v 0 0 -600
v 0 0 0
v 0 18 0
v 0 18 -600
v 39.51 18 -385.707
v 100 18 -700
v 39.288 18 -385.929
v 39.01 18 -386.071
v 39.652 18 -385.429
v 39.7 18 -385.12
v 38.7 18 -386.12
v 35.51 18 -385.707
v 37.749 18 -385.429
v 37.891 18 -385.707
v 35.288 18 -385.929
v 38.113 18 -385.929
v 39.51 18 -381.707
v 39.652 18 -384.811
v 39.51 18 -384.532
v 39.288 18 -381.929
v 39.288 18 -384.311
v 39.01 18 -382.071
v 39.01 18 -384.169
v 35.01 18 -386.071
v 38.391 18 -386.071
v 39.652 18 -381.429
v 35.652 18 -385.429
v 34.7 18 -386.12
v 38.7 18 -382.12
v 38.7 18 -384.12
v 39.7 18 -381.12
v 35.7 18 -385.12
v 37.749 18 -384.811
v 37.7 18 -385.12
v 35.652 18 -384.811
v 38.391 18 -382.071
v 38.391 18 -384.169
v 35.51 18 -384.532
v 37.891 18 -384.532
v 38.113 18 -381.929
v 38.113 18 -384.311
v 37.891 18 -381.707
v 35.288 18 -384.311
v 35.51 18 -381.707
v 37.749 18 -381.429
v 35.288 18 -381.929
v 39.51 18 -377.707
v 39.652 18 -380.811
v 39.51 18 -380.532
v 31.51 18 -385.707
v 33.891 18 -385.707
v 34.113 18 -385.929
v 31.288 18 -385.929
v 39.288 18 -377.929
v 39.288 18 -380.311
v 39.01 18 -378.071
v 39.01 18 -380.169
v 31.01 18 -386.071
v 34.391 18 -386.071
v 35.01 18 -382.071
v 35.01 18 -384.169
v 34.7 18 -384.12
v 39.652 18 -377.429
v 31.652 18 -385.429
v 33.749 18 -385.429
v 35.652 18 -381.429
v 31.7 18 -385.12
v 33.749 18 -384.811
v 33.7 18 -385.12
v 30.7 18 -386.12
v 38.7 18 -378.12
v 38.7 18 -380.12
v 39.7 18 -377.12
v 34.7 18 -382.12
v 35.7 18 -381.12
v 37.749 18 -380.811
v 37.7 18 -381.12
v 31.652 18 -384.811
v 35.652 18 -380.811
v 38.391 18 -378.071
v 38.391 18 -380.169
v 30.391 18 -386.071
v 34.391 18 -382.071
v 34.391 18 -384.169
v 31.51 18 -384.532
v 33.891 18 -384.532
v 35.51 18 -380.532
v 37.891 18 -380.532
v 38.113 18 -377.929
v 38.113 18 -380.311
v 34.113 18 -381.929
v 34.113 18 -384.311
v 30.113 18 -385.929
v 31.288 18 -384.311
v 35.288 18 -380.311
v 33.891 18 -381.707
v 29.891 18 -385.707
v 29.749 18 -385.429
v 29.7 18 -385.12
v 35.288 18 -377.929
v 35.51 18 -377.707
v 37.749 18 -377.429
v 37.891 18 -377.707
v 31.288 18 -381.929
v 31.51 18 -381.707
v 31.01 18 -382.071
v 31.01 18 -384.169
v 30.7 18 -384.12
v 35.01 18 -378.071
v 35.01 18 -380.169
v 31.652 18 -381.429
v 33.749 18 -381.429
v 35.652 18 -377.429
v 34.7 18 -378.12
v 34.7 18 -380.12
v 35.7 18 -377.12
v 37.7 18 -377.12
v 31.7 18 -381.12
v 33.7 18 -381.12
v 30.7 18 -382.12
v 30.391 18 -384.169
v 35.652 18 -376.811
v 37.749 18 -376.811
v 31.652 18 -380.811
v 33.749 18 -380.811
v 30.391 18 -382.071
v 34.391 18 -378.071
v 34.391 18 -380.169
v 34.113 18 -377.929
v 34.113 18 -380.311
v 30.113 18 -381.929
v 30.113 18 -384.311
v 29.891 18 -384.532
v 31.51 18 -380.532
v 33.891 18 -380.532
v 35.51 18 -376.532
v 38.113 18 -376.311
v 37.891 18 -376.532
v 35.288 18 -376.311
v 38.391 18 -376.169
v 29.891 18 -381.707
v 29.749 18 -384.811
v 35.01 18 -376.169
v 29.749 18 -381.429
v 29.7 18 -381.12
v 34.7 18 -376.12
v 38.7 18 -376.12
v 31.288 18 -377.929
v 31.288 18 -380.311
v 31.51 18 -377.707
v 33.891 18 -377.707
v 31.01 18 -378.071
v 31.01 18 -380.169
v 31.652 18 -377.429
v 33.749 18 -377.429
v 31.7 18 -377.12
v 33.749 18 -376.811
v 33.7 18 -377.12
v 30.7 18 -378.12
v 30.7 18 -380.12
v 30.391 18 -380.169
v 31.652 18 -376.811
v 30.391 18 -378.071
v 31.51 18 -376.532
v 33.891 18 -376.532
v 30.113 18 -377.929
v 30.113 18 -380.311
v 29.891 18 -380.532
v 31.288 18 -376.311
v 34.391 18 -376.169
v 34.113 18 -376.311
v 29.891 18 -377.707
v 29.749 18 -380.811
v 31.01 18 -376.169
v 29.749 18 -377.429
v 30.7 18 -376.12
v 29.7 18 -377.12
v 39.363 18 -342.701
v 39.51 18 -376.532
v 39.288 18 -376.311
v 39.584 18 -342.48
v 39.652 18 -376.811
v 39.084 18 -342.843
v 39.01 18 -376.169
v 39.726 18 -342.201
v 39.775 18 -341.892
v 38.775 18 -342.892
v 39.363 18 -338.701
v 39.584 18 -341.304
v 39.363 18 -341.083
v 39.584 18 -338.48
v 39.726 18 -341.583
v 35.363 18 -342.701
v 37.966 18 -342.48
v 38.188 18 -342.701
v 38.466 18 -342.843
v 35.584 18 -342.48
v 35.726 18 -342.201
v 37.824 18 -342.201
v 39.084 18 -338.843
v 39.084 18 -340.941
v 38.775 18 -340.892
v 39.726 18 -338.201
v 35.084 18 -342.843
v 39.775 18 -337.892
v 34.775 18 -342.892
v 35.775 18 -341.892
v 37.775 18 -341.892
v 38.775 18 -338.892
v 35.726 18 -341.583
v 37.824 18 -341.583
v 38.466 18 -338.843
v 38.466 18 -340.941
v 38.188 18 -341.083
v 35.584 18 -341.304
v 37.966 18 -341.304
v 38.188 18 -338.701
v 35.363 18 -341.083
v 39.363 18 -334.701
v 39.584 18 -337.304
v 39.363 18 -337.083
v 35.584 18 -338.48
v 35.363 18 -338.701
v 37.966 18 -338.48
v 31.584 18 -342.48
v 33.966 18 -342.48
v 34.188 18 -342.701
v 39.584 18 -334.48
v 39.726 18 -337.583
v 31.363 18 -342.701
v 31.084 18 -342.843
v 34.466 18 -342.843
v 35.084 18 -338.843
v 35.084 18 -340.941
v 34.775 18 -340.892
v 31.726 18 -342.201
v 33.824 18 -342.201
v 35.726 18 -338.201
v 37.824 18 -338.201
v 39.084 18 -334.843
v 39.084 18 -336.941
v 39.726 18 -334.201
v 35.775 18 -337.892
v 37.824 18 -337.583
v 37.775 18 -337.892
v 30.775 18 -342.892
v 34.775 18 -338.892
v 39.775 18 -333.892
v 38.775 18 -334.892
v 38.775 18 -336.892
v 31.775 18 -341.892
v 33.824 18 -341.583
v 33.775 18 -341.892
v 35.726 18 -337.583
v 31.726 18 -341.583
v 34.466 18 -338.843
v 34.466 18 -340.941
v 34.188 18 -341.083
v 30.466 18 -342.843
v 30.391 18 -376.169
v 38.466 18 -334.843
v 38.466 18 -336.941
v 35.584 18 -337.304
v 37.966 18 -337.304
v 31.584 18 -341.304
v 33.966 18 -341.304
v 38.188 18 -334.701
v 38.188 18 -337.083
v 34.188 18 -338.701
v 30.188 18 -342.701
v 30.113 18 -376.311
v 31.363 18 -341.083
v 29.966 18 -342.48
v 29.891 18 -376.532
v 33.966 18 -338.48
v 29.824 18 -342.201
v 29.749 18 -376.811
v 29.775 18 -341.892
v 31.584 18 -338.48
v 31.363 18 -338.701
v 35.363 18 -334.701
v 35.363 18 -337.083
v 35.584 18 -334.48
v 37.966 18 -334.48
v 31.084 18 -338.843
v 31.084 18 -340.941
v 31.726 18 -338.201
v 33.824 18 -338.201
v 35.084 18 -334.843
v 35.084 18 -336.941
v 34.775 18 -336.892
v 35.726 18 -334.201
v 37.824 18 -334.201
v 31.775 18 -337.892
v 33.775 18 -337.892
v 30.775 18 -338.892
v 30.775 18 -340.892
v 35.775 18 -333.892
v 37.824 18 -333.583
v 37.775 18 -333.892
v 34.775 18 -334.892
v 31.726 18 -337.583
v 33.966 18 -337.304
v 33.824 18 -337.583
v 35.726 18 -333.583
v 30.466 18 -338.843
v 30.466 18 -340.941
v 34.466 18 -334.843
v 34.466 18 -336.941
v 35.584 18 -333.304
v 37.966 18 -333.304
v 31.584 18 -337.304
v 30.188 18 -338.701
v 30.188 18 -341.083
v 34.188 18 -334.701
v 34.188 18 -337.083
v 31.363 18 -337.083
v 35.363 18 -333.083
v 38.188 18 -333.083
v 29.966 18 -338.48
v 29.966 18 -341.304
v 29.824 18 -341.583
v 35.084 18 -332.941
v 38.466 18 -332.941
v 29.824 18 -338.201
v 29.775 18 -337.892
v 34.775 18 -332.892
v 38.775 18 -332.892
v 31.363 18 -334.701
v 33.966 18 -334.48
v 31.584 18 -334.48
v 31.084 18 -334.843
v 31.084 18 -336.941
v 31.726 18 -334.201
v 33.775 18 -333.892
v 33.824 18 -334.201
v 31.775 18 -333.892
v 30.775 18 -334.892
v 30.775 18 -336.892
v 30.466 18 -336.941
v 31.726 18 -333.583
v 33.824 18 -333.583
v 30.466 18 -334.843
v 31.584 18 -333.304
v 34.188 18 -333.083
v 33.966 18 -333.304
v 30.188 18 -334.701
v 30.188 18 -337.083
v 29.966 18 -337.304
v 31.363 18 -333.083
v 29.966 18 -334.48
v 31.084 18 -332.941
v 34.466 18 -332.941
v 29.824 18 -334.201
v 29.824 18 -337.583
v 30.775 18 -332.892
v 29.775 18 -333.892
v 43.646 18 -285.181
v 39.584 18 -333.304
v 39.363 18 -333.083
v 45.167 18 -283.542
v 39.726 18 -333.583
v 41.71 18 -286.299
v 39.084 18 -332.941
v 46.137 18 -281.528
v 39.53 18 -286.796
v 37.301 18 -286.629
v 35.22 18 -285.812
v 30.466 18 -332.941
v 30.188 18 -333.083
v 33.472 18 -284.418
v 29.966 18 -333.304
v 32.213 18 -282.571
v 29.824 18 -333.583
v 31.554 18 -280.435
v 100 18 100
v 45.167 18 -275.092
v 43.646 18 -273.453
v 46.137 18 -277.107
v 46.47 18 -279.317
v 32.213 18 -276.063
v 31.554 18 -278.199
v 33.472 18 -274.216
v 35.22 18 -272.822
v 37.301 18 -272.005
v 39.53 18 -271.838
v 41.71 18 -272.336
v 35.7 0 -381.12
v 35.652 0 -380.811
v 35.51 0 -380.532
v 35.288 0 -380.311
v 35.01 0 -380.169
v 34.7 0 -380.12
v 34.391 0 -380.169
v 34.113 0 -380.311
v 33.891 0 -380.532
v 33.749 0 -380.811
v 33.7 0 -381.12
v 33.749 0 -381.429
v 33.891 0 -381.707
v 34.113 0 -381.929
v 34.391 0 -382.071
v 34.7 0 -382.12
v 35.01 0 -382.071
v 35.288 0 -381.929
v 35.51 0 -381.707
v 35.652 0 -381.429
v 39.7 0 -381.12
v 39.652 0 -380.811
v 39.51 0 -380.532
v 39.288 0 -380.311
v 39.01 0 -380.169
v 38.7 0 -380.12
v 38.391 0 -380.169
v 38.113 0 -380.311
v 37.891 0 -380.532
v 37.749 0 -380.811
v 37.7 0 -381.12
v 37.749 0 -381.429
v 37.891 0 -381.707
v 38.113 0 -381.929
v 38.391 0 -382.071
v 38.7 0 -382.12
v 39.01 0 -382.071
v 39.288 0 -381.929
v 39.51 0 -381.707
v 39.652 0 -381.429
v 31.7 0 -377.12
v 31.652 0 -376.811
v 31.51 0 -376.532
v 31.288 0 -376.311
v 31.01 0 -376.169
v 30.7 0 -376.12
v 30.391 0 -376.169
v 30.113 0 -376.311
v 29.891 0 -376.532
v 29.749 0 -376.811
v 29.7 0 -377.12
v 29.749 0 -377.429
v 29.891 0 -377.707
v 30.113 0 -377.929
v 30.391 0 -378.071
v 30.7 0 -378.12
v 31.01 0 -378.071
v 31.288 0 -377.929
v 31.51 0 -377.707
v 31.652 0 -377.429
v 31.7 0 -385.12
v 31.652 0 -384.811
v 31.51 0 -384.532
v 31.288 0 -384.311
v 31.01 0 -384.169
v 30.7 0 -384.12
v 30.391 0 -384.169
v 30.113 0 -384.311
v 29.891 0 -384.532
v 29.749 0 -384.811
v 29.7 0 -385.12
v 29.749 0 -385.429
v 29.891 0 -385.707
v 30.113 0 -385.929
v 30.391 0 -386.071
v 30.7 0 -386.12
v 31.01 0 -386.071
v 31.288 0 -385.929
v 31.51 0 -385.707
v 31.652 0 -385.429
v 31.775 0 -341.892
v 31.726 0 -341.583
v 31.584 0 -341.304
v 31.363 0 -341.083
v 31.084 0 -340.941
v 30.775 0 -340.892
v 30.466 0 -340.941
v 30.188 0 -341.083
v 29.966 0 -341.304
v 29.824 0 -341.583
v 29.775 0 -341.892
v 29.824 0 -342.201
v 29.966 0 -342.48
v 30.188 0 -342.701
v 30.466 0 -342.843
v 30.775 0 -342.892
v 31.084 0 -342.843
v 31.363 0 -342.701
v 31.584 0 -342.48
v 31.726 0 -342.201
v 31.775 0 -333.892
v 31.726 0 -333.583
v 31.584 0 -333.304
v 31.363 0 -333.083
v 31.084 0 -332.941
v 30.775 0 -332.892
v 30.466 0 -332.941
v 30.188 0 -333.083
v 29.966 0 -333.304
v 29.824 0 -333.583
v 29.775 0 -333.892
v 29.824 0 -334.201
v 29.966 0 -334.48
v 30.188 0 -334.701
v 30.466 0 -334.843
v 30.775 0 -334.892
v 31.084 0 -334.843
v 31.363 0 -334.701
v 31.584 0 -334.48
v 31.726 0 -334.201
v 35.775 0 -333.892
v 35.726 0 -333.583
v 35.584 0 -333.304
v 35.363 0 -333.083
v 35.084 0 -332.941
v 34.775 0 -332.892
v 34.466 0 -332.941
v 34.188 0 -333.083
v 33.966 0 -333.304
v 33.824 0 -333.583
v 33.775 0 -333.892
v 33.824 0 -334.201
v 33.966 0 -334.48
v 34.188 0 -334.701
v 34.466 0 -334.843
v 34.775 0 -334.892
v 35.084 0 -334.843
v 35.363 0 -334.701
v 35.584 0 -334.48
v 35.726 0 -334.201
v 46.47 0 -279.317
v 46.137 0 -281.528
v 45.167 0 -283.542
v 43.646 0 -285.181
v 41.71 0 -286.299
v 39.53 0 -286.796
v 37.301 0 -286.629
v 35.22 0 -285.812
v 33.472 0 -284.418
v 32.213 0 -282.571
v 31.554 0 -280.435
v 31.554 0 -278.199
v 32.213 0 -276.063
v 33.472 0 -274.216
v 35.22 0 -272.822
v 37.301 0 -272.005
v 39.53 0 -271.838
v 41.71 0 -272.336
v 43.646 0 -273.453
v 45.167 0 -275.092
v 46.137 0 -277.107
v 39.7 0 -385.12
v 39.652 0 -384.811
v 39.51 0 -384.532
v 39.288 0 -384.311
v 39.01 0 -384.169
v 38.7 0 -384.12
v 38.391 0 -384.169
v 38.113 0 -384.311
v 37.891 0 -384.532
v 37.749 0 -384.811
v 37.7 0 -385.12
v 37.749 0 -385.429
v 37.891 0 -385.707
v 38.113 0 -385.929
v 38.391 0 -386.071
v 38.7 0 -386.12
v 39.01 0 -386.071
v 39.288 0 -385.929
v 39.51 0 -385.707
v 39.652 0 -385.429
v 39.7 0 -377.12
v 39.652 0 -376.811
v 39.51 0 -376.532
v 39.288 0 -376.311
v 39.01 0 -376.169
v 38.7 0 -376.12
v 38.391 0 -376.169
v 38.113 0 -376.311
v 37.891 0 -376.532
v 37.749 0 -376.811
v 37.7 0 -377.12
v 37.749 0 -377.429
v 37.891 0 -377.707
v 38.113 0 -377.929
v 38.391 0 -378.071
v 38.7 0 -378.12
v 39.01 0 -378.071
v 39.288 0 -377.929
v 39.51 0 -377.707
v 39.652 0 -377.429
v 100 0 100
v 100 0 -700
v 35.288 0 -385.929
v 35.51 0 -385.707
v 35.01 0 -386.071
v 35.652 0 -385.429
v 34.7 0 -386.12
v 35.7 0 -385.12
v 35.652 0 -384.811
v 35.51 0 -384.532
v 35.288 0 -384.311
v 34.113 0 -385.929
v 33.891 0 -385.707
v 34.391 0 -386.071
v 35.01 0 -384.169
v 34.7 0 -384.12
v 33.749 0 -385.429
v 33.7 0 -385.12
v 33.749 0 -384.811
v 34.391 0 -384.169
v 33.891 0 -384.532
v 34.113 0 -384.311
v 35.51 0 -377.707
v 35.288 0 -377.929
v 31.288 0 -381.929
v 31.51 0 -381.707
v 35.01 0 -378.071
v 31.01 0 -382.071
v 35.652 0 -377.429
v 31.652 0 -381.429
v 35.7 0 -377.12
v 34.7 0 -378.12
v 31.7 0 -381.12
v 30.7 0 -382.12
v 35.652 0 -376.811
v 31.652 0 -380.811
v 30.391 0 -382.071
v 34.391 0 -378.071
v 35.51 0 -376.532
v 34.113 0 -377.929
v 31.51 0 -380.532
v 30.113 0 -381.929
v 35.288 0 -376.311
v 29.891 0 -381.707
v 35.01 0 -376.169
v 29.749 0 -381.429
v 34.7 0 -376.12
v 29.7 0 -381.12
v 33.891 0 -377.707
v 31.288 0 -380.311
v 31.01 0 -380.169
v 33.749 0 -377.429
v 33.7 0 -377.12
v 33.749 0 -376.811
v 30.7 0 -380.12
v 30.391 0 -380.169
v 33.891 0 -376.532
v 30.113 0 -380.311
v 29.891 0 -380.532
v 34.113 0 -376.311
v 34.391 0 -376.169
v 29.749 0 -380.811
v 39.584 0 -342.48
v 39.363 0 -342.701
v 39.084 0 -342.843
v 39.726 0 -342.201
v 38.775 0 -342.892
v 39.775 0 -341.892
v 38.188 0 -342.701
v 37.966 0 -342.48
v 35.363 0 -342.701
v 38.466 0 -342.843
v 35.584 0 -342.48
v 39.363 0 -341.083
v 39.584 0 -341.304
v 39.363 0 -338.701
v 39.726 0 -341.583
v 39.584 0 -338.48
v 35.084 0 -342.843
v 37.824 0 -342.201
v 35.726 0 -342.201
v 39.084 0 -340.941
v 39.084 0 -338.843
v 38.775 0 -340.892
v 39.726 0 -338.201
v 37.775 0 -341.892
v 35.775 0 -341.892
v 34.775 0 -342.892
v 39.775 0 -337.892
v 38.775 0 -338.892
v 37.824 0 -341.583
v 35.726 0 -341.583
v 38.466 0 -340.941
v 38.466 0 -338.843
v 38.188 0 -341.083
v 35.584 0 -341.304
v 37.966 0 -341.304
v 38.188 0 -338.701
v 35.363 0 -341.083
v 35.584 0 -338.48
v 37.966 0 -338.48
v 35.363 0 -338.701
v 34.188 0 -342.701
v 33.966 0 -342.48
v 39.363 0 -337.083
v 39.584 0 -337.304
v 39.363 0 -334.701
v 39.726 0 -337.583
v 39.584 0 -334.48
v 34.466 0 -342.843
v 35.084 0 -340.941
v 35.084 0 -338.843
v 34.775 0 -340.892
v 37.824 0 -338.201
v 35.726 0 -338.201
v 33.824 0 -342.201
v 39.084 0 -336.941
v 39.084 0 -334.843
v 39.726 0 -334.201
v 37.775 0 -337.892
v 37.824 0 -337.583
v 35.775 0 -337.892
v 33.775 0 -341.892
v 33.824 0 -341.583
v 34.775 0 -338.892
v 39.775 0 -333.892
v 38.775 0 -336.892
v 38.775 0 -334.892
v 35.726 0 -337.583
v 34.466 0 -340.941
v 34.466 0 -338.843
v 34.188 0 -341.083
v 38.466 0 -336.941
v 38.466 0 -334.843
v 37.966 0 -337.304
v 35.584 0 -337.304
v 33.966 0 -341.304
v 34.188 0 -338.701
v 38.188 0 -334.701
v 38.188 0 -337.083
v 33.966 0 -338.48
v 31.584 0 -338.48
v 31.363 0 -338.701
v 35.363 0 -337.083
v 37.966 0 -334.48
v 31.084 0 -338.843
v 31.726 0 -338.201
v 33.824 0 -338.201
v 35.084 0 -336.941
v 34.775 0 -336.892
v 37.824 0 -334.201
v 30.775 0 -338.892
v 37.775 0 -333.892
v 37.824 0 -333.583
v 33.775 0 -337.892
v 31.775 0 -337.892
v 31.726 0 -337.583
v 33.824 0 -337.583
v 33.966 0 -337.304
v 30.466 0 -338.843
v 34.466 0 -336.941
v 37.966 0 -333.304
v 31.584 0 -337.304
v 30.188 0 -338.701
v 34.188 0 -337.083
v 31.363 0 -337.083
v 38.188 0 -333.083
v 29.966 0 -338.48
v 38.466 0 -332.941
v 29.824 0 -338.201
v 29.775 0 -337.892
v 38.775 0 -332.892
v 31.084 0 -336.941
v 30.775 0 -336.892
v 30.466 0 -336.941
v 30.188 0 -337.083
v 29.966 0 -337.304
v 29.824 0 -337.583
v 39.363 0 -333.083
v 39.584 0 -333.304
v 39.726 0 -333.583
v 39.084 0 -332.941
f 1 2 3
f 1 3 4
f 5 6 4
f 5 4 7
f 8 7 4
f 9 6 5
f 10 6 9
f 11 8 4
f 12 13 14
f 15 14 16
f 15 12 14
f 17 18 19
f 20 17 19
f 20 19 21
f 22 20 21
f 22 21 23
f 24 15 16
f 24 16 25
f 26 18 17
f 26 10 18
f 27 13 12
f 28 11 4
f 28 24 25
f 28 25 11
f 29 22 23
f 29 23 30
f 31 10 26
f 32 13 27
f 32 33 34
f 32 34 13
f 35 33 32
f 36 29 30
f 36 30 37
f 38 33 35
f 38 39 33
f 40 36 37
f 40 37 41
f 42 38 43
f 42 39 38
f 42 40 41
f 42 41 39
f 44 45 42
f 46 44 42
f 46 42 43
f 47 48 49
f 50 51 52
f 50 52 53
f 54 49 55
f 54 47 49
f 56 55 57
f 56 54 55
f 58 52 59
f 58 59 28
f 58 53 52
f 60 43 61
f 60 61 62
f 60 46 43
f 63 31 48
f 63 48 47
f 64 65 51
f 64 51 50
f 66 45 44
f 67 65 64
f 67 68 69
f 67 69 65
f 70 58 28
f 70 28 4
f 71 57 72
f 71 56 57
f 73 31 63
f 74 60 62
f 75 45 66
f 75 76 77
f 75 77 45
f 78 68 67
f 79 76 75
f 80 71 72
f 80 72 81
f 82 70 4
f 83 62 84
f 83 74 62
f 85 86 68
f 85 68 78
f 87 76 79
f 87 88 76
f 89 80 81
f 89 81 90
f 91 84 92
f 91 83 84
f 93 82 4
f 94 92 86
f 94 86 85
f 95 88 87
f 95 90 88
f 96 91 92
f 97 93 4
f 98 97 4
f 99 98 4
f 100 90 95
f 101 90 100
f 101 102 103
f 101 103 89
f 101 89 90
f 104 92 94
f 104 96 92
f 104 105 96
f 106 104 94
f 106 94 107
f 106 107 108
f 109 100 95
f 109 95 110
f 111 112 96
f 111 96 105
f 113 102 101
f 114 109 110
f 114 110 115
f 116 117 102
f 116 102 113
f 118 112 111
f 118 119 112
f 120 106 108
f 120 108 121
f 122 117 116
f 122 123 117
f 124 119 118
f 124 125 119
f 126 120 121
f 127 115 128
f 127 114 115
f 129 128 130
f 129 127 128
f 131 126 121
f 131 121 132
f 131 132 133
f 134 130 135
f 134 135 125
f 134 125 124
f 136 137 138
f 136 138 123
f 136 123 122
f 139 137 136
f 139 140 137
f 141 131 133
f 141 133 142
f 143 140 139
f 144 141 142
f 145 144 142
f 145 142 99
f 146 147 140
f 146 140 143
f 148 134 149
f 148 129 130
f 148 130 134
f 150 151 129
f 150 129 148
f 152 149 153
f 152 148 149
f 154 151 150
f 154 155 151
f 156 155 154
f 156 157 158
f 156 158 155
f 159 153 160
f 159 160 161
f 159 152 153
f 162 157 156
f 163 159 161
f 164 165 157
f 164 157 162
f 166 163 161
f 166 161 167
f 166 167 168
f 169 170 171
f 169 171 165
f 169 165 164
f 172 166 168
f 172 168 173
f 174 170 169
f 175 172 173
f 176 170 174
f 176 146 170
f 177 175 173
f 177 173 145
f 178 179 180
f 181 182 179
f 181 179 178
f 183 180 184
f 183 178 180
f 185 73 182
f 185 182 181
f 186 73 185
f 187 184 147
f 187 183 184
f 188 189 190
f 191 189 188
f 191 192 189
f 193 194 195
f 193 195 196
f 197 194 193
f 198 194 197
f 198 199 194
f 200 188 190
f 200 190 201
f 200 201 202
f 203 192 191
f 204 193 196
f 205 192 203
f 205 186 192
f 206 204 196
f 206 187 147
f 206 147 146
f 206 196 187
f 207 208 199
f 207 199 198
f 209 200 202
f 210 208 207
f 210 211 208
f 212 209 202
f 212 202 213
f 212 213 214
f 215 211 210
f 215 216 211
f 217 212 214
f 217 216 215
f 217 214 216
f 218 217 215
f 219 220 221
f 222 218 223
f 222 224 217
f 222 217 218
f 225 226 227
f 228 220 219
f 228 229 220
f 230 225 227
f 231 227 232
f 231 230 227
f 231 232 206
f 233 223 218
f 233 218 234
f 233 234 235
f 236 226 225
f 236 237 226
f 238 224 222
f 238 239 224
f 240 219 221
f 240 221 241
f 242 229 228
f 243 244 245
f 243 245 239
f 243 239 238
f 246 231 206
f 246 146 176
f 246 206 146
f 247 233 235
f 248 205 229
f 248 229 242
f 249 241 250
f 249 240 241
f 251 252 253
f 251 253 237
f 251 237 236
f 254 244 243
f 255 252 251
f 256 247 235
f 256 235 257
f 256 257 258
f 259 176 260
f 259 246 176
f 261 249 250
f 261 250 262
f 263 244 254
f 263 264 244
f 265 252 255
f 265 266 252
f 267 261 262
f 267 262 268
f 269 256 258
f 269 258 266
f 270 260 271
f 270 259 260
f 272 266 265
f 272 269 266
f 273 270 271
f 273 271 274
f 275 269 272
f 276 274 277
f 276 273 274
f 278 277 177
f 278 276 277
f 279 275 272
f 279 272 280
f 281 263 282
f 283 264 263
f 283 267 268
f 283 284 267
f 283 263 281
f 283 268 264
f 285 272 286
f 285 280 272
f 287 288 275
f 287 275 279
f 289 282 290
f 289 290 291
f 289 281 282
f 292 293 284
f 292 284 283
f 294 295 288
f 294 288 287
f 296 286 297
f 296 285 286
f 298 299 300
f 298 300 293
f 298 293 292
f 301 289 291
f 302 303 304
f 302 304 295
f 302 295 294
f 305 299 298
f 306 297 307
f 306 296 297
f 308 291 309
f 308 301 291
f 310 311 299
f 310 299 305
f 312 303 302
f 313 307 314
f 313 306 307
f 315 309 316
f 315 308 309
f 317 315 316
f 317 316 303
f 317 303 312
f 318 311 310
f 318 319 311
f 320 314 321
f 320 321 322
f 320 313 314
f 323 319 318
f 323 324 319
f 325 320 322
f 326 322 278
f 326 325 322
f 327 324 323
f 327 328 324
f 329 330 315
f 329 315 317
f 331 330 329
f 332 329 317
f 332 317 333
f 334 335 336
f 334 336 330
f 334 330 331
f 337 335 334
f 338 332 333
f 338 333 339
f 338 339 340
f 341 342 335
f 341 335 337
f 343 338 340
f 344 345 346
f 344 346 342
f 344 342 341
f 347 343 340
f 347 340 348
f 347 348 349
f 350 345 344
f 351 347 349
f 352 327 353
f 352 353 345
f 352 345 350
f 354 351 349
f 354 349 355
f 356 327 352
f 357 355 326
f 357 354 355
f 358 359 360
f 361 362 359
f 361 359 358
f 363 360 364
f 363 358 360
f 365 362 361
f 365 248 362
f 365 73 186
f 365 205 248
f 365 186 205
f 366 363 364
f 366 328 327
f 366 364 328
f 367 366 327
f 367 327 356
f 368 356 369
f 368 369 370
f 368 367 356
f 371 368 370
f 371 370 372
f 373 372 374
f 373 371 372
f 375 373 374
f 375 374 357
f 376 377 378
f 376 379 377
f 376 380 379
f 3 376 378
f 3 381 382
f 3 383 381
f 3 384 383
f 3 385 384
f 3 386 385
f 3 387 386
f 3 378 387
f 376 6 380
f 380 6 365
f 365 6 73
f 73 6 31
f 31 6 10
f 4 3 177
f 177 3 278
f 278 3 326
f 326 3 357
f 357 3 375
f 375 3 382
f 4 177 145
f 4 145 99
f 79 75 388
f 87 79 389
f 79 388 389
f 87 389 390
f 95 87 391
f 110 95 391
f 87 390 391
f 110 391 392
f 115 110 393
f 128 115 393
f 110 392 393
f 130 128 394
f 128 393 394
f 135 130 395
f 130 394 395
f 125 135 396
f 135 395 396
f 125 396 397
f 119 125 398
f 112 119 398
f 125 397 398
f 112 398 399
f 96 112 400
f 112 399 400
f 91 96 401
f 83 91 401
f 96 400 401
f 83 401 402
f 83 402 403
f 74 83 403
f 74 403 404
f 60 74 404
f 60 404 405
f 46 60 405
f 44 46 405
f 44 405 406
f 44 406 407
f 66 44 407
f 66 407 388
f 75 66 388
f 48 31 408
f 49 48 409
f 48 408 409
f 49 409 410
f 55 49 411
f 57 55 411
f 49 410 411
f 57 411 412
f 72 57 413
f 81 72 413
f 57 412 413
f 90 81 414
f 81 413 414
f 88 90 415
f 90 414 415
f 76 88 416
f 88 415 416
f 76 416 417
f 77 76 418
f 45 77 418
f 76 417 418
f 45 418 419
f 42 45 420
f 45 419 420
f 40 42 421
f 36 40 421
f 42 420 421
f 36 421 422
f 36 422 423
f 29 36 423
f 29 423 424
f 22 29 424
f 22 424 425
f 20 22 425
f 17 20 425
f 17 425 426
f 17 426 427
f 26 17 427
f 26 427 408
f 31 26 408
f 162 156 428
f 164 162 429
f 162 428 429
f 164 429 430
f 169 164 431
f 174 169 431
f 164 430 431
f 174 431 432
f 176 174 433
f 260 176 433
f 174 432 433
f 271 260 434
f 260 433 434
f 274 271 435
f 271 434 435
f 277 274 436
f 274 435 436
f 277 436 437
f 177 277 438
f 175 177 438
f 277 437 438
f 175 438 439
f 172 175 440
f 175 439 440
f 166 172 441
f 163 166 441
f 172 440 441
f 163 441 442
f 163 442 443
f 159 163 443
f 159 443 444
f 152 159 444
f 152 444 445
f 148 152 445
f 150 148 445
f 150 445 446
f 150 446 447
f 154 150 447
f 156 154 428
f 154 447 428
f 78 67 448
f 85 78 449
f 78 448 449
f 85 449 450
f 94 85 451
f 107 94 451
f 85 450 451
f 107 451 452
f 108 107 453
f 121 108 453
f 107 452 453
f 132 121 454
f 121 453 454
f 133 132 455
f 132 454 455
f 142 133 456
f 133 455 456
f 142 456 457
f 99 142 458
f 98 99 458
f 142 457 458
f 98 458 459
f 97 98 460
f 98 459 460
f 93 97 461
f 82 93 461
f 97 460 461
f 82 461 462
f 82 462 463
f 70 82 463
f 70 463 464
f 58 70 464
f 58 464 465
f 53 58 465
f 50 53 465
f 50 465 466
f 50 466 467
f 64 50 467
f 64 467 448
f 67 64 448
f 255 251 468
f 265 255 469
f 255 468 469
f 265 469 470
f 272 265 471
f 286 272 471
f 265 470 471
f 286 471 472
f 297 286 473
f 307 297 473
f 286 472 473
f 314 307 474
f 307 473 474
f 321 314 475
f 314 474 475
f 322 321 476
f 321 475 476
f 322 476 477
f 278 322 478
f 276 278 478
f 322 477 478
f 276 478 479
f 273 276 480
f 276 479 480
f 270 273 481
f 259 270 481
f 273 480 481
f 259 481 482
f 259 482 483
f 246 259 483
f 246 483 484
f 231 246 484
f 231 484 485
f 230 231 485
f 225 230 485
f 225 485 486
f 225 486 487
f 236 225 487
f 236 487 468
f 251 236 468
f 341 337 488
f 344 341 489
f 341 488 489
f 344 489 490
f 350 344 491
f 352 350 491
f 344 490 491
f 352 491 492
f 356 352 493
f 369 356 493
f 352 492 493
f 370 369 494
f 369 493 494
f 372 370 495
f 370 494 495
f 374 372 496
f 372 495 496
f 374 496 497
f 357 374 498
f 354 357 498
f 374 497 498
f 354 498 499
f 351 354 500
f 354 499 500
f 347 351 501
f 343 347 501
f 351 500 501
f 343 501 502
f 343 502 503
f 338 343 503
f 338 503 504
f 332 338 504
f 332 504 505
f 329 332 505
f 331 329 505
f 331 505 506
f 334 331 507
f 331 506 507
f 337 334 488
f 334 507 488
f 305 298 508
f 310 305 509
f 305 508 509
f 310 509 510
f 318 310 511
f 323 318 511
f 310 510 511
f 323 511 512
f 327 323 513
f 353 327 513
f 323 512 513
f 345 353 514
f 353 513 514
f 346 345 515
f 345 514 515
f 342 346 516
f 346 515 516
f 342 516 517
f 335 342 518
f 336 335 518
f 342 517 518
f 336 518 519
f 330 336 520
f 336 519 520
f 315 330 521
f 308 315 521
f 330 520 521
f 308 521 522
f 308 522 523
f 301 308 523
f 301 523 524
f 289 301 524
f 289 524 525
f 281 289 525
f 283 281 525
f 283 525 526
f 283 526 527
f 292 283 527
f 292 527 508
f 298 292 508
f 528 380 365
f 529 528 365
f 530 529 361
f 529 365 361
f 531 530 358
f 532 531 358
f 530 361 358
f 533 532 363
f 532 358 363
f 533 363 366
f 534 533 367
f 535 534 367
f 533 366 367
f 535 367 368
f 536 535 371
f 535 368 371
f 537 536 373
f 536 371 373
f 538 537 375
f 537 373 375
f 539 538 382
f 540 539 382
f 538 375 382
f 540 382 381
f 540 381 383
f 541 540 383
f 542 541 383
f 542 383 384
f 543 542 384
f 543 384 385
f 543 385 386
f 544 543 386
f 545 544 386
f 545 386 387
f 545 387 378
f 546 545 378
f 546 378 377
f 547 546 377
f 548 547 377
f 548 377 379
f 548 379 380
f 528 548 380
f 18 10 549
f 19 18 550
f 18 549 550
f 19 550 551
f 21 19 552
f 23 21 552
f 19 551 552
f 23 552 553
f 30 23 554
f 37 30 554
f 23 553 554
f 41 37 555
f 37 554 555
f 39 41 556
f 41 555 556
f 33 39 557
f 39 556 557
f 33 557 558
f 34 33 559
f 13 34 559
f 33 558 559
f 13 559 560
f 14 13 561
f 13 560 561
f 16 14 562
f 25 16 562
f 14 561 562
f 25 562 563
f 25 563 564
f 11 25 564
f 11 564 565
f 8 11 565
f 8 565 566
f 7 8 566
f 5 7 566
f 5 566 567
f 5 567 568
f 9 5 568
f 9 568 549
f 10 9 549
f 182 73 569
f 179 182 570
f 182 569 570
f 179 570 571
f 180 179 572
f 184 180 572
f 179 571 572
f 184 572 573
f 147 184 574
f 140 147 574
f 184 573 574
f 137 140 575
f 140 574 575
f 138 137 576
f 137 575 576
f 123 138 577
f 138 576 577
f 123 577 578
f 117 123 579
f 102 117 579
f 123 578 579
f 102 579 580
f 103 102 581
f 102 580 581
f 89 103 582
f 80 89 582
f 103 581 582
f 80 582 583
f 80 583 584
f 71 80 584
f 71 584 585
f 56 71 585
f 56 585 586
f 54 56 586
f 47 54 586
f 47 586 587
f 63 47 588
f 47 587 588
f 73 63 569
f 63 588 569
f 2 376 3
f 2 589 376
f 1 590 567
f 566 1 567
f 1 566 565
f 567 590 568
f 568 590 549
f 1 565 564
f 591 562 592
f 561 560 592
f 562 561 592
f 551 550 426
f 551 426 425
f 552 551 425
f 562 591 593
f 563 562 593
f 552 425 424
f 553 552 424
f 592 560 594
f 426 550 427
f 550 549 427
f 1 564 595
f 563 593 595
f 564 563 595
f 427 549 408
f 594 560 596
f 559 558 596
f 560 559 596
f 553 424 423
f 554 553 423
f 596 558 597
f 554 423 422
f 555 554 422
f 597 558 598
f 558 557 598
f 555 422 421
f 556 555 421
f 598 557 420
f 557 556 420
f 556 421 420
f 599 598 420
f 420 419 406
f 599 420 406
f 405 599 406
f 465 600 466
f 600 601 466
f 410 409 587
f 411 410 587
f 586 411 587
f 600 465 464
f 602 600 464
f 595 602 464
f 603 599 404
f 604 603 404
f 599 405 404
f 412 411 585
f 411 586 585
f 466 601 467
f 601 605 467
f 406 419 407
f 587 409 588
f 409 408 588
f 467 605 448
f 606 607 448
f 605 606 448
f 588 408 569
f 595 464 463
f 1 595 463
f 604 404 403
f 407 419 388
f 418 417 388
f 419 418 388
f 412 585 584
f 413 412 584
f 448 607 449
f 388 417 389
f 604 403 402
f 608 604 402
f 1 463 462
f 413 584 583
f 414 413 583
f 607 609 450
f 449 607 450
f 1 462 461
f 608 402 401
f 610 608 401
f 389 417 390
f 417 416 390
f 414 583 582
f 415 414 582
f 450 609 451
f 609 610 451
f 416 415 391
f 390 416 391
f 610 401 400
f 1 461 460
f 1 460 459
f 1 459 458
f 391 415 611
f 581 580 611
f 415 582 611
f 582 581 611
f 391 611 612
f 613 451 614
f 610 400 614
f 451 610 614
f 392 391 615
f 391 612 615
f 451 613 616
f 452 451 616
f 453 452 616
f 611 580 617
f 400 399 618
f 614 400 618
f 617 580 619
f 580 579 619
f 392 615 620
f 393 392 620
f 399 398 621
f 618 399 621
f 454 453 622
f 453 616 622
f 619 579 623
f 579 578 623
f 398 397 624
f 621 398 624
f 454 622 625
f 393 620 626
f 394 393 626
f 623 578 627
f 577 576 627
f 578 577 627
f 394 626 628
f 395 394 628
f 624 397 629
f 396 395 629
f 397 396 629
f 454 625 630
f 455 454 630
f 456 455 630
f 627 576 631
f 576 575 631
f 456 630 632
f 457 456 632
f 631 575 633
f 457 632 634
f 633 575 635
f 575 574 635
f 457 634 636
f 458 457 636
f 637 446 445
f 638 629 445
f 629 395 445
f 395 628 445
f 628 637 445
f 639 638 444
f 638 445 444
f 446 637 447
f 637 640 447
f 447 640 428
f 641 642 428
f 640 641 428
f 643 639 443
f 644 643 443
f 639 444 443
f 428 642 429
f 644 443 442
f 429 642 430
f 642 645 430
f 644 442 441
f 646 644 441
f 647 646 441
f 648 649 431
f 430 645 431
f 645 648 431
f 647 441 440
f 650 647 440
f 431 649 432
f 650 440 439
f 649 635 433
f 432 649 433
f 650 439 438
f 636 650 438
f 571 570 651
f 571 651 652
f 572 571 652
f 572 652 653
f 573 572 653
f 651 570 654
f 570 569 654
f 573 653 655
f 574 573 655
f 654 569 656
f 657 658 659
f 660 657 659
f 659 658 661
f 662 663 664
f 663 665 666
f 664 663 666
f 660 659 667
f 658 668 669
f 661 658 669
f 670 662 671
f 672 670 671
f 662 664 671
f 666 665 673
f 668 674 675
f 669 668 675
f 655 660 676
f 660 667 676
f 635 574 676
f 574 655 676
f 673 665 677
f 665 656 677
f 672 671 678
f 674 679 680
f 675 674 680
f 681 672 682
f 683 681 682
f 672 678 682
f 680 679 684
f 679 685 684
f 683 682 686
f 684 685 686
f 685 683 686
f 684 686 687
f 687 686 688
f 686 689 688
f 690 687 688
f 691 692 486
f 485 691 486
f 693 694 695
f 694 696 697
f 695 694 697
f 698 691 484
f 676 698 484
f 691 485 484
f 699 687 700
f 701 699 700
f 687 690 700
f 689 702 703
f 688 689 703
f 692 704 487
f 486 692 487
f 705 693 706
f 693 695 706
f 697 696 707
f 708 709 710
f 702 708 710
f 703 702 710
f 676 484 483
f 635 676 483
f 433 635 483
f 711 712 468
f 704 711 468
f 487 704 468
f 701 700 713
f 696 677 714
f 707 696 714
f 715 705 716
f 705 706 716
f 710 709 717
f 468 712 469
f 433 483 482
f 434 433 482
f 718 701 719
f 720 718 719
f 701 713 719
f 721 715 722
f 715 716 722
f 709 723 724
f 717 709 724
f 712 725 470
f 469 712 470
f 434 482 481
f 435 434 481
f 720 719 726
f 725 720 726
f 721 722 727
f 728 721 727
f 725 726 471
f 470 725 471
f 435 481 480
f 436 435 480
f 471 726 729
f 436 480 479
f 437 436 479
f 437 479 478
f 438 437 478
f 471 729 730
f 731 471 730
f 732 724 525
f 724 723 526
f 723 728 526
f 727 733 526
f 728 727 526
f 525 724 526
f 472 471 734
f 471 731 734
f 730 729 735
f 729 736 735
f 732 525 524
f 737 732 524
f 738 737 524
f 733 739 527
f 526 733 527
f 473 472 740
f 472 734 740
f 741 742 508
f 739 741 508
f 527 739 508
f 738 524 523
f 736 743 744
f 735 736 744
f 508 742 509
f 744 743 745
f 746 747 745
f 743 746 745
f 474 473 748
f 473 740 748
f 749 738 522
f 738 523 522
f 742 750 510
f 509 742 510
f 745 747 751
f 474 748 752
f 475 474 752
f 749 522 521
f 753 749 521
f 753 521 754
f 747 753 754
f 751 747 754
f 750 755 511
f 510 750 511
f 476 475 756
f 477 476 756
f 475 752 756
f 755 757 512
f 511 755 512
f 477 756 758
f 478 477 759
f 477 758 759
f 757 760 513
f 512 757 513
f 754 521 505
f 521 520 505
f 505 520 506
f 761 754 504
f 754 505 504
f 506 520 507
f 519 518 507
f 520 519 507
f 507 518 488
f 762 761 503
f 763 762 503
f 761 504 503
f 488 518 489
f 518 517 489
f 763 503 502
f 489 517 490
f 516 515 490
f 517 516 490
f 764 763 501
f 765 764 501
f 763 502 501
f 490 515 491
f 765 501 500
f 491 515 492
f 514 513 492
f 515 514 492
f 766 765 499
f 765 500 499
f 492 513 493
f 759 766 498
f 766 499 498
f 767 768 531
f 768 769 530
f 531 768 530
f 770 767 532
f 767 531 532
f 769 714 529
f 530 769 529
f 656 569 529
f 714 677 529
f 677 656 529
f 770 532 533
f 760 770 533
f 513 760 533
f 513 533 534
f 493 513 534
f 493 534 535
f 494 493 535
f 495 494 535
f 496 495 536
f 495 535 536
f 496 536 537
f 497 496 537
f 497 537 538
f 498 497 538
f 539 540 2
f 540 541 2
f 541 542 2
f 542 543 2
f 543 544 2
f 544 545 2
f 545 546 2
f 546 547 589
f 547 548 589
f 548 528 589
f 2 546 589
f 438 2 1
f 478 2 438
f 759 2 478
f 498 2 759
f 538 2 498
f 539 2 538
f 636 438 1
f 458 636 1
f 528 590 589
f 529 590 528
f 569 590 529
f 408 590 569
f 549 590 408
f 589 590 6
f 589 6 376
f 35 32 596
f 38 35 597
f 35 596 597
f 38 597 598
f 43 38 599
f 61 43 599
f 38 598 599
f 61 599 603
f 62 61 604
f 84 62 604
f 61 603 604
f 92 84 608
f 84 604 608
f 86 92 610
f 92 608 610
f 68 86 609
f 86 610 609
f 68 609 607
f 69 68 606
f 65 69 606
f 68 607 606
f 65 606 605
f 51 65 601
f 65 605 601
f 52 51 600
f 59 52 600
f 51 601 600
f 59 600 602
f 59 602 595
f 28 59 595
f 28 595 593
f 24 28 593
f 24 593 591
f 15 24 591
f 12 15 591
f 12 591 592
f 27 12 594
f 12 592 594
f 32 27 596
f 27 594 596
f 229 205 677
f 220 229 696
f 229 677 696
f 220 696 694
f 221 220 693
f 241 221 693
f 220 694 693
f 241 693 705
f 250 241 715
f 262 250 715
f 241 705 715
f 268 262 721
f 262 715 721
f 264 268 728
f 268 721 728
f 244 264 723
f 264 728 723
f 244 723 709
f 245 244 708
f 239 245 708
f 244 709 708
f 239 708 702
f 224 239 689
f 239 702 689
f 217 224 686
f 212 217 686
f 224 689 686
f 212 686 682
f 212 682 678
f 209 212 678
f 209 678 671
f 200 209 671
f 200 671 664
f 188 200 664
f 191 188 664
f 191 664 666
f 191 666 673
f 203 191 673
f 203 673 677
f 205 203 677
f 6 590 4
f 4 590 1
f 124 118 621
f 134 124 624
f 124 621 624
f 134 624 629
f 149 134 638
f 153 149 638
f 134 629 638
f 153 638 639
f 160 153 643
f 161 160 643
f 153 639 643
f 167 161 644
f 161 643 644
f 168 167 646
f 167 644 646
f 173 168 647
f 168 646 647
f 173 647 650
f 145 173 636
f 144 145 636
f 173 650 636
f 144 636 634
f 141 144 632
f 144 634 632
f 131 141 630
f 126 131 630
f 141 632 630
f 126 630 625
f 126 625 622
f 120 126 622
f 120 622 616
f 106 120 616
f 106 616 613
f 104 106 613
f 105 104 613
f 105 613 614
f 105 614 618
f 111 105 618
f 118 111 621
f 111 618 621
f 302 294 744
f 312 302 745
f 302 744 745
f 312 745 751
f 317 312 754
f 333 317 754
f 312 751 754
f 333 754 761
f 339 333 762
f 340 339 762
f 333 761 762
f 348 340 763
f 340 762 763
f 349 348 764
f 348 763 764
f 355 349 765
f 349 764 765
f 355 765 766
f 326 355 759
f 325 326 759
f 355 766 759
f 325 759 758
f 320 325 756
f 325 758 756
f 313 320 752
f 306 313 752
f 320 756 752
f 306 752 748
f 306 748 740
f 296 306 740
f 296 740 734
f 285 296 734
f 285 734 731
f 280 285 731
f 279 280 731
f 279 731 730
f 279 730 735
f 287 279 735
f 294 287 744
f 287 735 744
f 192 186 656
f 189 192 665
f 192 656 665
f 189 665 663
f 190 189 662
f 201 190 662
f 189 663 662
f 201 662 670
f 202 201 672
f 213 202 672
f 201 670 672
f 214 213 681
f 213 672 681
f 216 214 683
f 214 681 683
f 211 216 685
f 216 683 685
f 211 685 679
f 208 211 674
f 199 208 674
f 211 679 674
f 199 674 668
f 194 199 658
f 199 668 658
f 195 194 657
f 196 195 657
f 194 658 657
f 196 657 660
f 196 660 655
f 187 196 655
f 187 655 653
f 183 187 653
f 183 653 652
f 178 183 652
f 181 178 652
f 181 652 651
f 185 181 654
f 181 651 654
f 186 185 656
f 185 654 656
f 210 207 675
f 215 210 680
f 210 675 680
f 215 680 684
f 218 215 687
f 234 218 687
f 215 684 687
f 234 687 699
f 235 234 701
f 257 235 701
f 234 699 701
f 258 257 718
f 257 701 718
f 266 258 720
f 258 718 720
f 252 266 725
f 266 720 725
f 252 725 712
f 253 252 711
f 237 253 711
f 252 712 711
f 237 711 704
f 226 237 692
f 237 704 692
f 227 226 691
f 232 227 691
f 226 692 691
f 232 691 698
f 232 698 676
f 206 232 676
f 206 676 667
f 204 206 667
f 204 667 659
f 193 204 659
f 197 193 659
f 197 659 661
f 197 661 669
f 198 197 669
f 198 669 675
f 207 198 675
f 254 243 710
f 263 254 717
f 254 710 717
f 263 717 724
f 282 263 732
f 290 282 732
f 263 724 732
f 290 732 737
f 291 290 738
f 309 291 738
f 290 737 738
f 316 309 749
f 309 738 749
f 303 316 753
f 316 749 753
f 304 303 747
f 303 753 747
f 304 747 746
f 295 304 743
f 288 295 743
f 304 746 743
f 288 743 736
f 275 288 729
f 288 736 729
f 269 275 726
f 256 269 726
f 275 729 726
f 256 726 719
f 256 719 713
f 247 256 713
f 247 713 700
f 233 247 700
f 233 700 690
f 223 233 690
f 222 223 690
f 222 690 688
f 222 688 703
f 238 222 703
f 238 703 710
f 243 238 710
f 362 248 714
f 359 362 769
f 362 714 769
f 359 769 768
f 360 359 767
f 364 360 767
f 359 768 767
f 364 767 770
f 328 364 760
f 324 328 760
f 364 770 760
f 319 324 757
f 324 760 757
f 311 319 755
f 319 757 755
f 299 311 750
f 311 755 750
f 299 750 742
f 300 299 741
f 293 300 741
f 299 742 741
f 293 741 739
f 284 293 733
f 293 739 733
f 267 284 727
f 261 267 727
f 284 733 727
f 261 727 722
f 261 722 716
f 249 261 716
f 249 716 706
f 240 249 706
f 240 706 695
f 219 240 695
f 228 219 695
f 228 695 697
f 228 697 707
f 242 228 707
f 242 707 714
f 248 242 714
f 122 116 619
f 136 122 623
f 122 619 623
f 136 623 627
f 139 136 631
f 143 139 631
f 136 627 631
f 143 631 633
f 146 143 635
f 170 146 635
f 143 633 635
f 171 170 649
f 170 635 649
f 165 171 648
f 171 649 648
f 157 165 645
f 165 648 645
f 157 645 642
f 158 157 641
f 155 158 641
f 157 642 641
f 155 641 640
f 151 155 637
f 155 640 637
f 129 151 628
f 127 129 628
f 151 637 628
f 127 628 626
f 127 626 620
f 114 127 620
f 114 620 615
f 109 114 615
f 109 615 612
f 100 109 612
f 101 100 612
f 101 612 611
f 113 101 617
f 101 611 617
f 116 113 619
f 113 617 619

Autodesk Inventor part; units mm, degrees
ref_plane "YZ Plane" through (0, 0, 0) normal (1, 0, 0) x (0, 1, 0)
ref_plane "XZ Plane" through (0, 0, 0) normal (0, 1, 0) x (-1, 0, 0)
ref_plane "XY Plane" through (0, 0, 0) normal (0, 0, 1) x (1, 0, 0)
sketch "Sketch1" plane through (0, 0, 0) normal (0, 1, 0) x (-1, 0, 0)
  line L0 (0, 0) -> (0, -600)
  line L1 (0, 0) -> (-100, 0)
  line L2 (-100, 0) -> (-100, 100)
  line L3 (-100, 100) -> (0, 0)
  line L4 (0, -600) -> (-100, -600)
  line L5 (-100, -600) -> (-100, -700)
  line L6 (-100, -700) -> (0, -600)
  line L7 (-100, -600) -> (-100, 0)
  dimension "d0" = 600
  dimension "d1" = 100
  dimension "d2" = 100
  dimension "d3" = 100
  dimension "d4" = 100
extrude "Extrusion1" add sketch "Sketch1" along normal blind 18
sketch "Sketch3" plane through (0, 18, 0) normal (0, 1, 0) x (1, 0, 0)
  circle A0 centre (38.9698, 279.3172) radius 7.5
  line L0 (100, 700) -> (0, 600)
  line L1 (0, 0) -> (100, -100)
  line L2 (0, 0) -> (100, -100) projected
  line L3 (100, -100) -> (100, 700) projected
  line L4 (100, 700) -> (0, 600) projected
  line L5 (0, 600) -> (0, 0) projected
extrude "Extrusion2" cut sketch "Sketch3" against normal blind 20 contours A0
sketch "Sketch4" plane through (0, 0, 0) normal (0, -1, 0) x (1, 0, 0)
  circle A0 centre (38.9698, -279.3172) radius 7.5
  line L0 (100, 100) -> (100, -700)
  line L1 (17.2005, -615) -> (17.2005, 25)
  line L2 (22.2005, -326.9779) -> (47.2005, -326.9779)
  line L3 (47.2005, -326.9779) -> (47.2005, -391.9779)
  line L4 (47.2005, -391.9779) -> (22.2005, -391.9779)
  line L5 (0, -600) -> (0, 0)
  line L6 (100, -700) -> (0, -600)
  line L7 (0, 0) -> (100, 100)
  circle A1 centre (38.9698, -279.3539) radius 7.5
  circle A2 centre (38.9698, -279.3539) radius 4.625
  circle A3 centre (38.9698, -279.3539) radius 5.75
  circle A4 centre (38.7754, -333.8918) radius 1
  circle A5 centre (34.7754, -333.8918) radius 1
  circle A6 centre (30.7754, -333.8918) radius 1
  circle A7 centre (38.7754, -337.8918) radius 1
  circle A8 centre (34.7754, -337.8918) radius 1
  circle A9 centre (30.7754, -337.8918) radius 1
  circle A10 centre (38.7754, -341.8918) radius 1
  circle A11 centre (34.7754, -341.8918) radius 1
  circle A12 centre (30.7754, -341.8918) radius 1
  circle A13 centre (38.7005, -377.1197) radius 1
  circle A14 centre (34.7005, -377.1197) radius 1
  circle A15 centre (30.7005, -377.1197) radius 1
  circle A16 centre (38.7005, -381.1197) radius 1
  circle A17 centre (34.7005, -381.1197) radius 1
  circle A18 centre (30.7005, -381.1197) radius 1
  circle A19 centre (38.7005, -385.1197) radius 1
  circle A20 centre (34.7005, -385.1197) radius 1
  circle A21 centre (30.7005, -385.1197) radius 1
  dimension "d9" = 2
  dimension "d12" = 4
  dimension "d15" = 4
  dimension "d18" = 2
  dimension "d19" = 4
  dimension "d20" = 4
extrude "Extrusion3" cut sketch "Sketch4" against normal blind 20 contours A4 | A5 | A6 | A7 | A8 | A9 | A10 | A11 | A12 | A13 | A14 | A15 | A16 | A17 | A18 | A19 | A20 | A21
properties part number "Fata_4"
